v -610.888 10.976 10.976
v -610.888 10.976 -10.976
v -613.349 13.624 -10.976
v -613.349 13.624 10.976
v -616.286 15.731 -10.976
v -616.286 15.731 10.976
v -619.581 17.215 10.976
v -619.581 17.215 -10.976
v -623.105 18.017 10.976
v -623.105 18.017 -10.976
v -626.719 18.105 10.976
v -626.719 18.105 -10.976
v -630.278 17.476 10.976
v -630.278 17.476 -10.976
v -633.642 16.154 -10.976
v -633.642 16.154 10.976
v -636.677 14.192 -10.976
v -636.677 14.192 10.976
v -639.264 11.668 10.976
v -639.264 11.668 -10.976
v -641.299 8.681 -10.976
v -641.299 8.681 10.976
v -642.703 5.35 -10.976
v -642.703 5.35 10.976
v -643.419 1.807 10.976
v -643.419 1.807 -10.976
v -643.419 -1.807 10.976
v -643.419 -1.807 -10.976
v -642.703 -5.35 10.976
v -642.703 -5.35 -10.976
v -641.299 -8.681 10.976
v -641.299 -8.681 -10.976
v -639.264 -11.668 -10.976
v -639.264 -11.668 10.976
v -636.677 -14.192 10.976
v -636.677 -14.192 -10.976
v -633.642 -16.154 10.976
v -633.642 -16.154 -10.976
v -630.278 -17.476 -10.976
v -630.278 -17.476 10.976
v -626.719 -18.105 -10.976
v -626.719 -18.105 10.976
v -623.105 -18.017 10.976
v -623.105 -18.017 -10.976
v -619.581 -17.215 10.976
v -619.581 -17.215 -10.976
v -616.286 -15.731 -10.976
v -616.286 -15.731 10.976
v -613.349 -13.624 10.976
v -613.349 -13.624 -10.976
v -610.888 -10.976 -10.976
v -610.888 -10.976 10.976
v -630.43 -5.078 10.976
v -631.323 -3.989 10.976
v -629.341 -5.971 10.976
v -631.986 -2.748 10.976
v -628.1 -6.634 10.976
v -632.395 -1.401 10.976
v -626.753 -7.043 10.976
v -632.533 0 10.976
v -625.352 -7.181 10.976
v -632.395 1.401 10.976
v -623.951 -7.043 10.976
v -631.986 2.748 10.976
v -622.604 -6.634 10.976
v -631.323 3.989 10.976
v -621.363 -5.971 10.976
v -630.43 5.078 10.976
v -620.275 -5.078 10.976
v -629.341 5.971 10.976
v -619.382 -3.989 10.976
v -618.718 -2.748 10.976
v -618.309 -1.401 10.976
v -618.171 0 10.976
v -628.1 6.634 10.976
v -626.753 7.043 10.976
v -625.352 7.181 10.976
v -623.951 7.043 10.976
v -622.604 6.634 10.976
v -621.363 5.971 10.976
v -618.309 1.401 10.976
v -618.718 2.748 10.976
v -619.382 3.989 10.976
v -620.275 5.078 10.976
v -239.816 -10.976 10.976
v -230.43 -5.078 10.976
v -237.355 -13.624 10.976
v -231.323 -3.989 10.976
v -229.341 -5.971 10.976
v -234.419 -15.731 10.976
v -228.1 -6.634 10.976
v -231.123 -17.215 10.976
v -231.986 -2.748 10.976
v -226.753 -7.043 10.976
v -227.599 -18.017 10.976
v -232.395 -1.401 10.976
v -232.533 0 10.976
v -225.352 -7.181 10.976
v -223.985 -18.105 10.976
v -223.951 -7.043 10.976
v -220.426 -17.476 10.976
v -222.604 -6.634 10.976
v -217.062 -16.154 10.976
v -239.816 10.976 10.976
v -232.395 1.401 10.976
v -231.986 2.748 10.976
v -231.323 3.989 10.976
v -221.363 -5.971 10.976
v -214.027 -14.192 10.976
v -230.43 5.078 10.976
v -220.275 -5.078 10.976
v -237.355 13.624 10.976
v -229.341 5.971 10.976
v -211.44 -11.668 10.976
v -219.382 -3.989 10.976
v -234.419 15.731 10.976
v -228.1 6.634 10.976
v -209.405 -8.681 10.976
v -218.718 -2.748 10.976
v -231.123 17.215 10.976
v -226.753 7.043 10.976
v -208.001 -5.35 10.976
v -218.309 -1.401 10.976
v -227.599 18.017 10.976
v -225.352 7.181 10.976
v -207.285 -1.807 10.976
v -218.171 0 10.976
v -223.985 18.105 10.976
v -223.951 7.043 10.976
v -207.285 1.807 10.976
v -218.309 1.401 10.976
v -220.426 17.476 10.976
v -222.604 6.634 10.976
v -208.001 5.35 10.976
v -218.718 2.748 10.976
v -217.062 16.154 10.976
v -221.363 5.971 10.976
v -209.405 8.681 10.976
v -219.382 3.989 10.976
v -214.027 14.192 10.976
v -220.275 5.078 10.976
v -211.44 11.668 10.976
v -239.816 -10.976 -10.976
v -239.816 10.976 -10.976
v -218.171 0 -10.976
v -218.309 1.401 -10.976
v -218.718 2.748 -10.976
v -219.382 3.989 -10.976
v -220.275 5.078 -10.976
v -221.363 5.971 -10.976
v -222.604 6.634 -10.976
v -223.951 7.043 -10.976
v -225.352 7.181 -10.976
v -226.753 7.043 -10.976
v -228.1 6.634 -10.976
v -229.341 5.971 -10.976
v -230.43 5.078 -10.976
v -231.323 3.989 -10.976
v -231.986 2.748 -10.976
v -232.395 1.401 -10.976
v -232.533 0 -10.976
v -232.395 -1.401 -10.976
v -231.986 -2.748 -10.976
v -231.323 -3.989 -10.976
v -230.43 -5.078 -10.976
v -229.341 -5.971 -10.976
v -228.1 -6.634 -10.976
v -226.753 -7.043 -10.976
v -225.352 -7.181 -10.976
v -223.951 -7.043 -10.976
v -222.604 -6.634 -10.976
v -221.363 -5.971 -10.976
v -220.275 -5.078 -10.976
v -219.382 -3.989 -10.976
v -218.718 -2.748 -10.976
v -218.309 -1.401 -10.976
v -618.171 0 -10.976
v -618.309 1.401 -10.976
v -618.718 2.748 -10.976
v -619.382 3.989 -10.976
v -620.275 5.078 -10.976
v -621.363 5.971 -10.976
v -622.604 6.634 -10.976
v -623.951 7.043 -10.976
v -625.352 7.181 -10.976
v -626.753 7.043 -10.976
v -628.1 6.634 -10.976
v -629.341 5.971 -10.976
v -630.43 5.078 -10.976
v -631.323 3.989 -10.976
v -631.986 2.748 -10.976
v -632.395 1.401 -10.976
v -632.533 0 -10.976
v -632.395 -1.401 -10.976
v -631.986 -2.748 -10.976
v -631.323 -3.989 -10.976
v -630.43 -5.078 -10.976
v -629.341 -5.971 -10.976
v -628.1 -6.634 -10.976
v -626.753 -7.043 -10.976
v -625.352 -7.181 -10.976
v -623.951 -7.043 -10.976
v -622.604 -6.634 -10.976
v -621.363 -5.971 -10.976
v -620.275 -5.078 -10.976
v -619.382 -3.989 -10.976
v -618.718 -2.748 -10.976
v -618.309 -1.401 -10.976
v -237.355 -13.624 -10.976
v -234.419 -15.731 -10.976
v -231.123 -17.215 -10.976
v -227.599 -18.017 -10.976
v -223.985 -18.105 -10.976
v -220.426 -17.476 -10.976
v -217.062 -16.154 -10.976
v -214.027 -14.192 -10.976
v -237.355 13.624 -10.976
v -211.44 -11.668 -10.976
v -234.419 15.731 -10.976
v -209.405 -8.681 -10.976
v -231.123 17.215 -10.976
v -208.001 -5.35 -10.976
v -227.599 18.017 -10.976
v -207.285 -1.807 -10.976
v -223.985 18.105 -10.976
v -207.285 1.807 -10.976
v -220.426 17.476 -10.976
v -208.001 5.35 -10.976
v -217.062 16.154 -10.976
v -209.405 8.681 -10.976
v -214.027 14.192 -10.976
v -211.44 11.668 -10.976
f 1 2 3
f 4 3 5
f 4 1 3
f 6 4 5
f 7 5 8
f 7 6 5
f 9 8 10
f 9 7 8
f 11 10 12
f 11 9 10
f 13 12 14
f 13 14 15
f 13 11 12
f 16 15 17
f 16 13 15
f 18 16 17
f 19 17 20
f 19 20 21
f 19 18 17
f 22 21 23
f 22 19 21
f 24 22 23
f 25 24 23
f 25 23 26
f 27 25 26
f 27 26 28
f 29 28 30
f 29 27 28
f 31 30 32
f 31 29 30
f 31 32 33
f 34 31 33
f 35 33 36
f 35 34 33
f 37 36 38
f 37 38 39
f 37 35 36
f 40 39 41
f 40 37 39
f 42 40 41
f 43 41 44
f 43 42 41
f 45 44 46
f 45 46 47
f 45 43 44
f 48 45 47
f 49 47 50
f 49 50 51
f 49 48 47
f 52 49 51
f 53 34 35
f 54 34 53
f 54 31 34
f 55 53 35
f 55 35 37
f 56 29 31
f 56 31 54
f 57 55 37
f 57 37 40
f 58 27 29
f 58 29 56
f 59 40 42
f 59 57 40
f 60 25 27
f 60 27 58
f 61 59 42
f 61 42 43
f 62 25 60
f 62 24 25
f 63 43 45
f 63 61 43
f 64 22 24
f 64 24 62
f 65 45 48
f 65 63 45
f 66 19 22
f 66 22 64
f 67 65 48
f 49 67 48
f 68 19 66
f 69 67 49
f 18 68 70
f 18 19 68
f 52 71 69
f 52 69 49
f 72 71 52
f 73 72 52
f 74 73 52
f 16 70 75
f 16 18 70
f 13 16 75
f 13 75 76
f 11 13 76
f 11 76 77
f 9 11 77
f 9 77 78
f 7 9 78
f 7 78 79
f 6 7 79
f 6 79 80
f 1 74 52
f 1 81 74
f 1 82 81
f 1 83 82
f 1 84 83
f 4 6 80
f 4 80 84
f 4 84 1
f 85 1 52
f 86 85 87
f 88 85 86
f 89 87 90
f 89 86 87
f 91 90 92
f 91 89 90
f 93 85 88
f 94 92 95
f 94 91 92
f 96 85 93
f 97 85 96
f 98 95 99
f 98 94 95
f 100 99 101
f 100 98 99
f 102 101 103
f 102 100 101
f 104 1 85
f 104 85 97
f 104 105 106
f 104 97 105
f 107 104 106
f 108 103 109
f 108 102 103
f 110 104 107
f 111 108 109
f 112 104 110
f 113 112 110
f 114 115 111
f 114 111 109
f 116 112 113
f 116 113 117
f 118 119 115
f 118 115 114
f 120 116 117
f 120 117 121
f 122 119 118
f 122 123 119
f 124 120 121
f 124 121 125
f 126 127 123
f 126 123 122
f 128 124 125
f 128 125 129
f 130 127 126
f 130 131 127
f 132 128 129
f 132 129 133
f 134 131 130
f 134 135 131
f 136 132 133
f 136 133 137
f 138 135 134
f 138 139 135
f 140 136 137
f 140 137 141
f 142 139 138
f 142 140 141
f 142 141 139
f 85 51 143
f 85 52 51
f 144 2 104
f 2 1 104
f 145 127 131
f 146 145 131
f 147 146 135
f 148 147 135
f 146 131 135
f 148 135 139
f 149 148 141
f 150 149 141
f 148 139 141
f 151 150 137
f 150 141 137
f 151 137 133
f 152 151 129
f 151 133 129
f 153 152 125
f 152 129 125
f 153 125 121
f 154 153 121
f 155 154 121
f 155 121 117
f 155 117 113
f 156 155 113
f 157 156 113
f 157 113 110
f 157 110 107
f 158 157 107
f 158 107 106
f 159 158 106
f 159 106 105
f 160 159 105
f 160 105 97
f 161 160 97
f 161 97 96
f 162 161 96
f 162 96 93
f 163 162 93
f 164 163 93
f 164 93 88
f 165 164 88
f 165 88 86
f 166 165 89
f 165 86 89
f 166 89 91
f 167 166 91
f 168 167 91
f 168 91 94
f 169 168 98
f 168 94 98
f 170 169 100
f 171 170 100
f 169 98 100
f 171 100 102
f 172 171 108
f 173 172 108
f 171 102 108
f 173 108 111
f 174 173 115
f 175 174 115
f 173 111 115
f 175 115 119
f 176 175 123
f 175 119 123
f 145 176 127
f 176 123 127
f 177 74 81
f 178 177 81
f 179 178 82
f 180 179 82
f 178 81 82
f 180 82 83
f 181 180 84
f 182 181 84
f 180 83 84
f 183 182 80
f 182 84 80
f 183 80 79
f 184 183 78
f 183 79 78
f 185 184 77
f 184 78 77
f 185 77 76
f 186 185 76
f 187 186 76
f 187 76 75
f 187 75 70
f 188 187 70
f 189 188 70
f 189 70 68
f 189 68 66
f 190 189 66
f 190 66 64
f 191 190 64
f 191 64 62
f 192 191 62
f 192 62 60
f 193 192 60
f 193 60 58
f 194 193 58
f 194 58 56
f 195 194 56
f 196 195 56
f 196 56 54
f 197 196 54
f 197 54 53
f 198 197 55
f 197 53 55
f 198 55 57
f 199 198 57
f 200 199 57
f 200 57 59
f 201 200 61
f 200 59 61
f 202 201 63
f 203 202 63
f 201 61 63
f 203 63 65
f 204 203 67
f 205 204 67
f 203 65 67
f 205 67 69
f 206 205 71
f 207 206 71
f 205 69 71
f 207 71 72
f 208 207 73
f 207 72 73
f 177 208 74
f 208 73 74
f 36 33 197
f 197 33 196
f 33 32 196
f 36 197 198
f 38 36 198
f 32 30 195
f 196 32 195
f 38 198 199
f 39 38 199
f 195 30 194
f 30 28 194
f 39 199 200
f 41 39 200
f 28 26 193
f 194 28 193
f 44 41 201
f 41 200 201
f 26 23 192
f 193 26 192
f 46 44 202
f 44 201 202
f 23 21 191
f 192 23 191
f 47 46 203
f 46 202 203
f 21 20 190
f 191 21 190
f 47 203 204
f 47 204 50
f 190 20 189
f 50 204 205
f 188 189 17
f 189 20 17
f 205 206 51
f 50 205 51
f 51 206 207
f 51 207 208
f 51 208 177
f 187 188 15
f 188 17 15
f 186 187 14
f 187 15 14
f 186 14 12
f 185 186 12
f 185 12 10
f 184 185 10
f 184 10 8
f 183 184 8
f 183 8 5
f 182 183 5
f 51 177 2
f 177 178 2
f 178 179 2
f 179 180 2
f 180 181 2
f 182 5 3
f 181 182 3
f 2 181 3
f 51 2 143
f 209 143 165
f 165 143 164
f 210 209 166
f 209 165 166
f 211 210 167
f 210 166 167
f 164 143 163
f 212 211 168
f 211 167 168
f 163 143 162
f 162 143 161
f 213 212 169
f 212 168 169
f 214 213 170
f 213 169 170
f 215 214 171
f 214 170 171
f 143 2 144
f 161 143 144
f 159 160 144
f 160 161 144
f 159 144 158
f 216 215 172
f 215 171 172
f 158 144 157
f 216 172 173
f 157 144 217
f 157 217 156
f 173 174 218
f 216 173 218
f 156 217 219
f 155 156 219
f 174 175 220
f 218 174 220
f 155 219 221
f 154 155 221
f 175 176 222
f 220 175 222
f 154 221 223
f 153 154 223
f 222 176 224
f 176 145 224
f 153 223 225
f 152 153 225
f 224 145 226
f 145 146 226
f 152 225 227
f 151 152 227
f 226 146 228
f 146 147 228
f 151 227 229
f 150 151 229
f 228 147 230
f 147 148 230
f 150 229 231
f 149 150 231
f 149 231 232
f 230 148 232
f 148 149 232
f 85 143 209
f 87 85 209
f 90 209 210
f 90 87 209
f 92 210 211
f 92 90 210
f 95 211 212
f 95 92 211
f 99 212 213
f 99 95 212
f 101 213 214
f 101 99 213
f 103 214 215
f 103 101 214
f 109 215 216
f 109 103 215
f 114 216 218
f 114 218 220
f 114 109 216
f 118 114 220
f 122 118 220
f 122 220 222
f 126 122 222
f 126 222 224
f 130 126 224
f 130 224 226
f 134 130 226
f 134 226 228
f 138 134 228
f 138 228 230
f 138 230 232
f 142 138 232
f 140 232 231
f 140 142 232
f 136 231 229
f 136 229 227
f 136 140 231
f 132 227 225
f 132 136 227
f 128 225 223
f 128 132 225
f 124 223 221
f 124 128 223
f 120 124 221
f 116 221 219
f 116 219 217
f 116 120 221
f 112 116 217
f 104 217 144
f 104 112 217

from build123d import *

# Parameters (mm, degrees)
SKETCH3_R           = 18.15695
SKETCH3_W           = 371.0727278
SKETCH3_H           = 21.9525
BOSS_EXTRUDE1_DEPTH = 10.97625
SKETCH4_R           = 7.1807
CUT_EXTRUDE1_DEPTH  = 645.139348927


with BuildPart() as part:
    # Sketch3 → Boss-Extrude1 (new, symmetric)
    with BuildSketch(Plane.XY):
        with Locations((-625.352112676, 0)):
            Circle(SKETCH3_R)
        with Locations((-225.352112676, 0)):
            Circle(SKETCH3_R)
        with Locations((-425.352112676, 0)):
            Rectangle(SKETCH3_W, SKETCH3_H)
    extrude(amount=BOSS_EXTRUDE1_DEPTH, both=True)

    # Sketch4 → Cut-Extrude1 (cut, through all)
    with BuildSketch(Plane.XY.offset(10.97625)):
        with Locations((-625.352112676, 0)):
            Circle(SKETCH4_R)
        with Locations((-225.352112676, 0)):
            Circle(SKETCH4_R)
    extrude(amount=-CUT_EXTRUDE1_DEPTH, mode=Mode.SUBTRACT)


solid = part.part
